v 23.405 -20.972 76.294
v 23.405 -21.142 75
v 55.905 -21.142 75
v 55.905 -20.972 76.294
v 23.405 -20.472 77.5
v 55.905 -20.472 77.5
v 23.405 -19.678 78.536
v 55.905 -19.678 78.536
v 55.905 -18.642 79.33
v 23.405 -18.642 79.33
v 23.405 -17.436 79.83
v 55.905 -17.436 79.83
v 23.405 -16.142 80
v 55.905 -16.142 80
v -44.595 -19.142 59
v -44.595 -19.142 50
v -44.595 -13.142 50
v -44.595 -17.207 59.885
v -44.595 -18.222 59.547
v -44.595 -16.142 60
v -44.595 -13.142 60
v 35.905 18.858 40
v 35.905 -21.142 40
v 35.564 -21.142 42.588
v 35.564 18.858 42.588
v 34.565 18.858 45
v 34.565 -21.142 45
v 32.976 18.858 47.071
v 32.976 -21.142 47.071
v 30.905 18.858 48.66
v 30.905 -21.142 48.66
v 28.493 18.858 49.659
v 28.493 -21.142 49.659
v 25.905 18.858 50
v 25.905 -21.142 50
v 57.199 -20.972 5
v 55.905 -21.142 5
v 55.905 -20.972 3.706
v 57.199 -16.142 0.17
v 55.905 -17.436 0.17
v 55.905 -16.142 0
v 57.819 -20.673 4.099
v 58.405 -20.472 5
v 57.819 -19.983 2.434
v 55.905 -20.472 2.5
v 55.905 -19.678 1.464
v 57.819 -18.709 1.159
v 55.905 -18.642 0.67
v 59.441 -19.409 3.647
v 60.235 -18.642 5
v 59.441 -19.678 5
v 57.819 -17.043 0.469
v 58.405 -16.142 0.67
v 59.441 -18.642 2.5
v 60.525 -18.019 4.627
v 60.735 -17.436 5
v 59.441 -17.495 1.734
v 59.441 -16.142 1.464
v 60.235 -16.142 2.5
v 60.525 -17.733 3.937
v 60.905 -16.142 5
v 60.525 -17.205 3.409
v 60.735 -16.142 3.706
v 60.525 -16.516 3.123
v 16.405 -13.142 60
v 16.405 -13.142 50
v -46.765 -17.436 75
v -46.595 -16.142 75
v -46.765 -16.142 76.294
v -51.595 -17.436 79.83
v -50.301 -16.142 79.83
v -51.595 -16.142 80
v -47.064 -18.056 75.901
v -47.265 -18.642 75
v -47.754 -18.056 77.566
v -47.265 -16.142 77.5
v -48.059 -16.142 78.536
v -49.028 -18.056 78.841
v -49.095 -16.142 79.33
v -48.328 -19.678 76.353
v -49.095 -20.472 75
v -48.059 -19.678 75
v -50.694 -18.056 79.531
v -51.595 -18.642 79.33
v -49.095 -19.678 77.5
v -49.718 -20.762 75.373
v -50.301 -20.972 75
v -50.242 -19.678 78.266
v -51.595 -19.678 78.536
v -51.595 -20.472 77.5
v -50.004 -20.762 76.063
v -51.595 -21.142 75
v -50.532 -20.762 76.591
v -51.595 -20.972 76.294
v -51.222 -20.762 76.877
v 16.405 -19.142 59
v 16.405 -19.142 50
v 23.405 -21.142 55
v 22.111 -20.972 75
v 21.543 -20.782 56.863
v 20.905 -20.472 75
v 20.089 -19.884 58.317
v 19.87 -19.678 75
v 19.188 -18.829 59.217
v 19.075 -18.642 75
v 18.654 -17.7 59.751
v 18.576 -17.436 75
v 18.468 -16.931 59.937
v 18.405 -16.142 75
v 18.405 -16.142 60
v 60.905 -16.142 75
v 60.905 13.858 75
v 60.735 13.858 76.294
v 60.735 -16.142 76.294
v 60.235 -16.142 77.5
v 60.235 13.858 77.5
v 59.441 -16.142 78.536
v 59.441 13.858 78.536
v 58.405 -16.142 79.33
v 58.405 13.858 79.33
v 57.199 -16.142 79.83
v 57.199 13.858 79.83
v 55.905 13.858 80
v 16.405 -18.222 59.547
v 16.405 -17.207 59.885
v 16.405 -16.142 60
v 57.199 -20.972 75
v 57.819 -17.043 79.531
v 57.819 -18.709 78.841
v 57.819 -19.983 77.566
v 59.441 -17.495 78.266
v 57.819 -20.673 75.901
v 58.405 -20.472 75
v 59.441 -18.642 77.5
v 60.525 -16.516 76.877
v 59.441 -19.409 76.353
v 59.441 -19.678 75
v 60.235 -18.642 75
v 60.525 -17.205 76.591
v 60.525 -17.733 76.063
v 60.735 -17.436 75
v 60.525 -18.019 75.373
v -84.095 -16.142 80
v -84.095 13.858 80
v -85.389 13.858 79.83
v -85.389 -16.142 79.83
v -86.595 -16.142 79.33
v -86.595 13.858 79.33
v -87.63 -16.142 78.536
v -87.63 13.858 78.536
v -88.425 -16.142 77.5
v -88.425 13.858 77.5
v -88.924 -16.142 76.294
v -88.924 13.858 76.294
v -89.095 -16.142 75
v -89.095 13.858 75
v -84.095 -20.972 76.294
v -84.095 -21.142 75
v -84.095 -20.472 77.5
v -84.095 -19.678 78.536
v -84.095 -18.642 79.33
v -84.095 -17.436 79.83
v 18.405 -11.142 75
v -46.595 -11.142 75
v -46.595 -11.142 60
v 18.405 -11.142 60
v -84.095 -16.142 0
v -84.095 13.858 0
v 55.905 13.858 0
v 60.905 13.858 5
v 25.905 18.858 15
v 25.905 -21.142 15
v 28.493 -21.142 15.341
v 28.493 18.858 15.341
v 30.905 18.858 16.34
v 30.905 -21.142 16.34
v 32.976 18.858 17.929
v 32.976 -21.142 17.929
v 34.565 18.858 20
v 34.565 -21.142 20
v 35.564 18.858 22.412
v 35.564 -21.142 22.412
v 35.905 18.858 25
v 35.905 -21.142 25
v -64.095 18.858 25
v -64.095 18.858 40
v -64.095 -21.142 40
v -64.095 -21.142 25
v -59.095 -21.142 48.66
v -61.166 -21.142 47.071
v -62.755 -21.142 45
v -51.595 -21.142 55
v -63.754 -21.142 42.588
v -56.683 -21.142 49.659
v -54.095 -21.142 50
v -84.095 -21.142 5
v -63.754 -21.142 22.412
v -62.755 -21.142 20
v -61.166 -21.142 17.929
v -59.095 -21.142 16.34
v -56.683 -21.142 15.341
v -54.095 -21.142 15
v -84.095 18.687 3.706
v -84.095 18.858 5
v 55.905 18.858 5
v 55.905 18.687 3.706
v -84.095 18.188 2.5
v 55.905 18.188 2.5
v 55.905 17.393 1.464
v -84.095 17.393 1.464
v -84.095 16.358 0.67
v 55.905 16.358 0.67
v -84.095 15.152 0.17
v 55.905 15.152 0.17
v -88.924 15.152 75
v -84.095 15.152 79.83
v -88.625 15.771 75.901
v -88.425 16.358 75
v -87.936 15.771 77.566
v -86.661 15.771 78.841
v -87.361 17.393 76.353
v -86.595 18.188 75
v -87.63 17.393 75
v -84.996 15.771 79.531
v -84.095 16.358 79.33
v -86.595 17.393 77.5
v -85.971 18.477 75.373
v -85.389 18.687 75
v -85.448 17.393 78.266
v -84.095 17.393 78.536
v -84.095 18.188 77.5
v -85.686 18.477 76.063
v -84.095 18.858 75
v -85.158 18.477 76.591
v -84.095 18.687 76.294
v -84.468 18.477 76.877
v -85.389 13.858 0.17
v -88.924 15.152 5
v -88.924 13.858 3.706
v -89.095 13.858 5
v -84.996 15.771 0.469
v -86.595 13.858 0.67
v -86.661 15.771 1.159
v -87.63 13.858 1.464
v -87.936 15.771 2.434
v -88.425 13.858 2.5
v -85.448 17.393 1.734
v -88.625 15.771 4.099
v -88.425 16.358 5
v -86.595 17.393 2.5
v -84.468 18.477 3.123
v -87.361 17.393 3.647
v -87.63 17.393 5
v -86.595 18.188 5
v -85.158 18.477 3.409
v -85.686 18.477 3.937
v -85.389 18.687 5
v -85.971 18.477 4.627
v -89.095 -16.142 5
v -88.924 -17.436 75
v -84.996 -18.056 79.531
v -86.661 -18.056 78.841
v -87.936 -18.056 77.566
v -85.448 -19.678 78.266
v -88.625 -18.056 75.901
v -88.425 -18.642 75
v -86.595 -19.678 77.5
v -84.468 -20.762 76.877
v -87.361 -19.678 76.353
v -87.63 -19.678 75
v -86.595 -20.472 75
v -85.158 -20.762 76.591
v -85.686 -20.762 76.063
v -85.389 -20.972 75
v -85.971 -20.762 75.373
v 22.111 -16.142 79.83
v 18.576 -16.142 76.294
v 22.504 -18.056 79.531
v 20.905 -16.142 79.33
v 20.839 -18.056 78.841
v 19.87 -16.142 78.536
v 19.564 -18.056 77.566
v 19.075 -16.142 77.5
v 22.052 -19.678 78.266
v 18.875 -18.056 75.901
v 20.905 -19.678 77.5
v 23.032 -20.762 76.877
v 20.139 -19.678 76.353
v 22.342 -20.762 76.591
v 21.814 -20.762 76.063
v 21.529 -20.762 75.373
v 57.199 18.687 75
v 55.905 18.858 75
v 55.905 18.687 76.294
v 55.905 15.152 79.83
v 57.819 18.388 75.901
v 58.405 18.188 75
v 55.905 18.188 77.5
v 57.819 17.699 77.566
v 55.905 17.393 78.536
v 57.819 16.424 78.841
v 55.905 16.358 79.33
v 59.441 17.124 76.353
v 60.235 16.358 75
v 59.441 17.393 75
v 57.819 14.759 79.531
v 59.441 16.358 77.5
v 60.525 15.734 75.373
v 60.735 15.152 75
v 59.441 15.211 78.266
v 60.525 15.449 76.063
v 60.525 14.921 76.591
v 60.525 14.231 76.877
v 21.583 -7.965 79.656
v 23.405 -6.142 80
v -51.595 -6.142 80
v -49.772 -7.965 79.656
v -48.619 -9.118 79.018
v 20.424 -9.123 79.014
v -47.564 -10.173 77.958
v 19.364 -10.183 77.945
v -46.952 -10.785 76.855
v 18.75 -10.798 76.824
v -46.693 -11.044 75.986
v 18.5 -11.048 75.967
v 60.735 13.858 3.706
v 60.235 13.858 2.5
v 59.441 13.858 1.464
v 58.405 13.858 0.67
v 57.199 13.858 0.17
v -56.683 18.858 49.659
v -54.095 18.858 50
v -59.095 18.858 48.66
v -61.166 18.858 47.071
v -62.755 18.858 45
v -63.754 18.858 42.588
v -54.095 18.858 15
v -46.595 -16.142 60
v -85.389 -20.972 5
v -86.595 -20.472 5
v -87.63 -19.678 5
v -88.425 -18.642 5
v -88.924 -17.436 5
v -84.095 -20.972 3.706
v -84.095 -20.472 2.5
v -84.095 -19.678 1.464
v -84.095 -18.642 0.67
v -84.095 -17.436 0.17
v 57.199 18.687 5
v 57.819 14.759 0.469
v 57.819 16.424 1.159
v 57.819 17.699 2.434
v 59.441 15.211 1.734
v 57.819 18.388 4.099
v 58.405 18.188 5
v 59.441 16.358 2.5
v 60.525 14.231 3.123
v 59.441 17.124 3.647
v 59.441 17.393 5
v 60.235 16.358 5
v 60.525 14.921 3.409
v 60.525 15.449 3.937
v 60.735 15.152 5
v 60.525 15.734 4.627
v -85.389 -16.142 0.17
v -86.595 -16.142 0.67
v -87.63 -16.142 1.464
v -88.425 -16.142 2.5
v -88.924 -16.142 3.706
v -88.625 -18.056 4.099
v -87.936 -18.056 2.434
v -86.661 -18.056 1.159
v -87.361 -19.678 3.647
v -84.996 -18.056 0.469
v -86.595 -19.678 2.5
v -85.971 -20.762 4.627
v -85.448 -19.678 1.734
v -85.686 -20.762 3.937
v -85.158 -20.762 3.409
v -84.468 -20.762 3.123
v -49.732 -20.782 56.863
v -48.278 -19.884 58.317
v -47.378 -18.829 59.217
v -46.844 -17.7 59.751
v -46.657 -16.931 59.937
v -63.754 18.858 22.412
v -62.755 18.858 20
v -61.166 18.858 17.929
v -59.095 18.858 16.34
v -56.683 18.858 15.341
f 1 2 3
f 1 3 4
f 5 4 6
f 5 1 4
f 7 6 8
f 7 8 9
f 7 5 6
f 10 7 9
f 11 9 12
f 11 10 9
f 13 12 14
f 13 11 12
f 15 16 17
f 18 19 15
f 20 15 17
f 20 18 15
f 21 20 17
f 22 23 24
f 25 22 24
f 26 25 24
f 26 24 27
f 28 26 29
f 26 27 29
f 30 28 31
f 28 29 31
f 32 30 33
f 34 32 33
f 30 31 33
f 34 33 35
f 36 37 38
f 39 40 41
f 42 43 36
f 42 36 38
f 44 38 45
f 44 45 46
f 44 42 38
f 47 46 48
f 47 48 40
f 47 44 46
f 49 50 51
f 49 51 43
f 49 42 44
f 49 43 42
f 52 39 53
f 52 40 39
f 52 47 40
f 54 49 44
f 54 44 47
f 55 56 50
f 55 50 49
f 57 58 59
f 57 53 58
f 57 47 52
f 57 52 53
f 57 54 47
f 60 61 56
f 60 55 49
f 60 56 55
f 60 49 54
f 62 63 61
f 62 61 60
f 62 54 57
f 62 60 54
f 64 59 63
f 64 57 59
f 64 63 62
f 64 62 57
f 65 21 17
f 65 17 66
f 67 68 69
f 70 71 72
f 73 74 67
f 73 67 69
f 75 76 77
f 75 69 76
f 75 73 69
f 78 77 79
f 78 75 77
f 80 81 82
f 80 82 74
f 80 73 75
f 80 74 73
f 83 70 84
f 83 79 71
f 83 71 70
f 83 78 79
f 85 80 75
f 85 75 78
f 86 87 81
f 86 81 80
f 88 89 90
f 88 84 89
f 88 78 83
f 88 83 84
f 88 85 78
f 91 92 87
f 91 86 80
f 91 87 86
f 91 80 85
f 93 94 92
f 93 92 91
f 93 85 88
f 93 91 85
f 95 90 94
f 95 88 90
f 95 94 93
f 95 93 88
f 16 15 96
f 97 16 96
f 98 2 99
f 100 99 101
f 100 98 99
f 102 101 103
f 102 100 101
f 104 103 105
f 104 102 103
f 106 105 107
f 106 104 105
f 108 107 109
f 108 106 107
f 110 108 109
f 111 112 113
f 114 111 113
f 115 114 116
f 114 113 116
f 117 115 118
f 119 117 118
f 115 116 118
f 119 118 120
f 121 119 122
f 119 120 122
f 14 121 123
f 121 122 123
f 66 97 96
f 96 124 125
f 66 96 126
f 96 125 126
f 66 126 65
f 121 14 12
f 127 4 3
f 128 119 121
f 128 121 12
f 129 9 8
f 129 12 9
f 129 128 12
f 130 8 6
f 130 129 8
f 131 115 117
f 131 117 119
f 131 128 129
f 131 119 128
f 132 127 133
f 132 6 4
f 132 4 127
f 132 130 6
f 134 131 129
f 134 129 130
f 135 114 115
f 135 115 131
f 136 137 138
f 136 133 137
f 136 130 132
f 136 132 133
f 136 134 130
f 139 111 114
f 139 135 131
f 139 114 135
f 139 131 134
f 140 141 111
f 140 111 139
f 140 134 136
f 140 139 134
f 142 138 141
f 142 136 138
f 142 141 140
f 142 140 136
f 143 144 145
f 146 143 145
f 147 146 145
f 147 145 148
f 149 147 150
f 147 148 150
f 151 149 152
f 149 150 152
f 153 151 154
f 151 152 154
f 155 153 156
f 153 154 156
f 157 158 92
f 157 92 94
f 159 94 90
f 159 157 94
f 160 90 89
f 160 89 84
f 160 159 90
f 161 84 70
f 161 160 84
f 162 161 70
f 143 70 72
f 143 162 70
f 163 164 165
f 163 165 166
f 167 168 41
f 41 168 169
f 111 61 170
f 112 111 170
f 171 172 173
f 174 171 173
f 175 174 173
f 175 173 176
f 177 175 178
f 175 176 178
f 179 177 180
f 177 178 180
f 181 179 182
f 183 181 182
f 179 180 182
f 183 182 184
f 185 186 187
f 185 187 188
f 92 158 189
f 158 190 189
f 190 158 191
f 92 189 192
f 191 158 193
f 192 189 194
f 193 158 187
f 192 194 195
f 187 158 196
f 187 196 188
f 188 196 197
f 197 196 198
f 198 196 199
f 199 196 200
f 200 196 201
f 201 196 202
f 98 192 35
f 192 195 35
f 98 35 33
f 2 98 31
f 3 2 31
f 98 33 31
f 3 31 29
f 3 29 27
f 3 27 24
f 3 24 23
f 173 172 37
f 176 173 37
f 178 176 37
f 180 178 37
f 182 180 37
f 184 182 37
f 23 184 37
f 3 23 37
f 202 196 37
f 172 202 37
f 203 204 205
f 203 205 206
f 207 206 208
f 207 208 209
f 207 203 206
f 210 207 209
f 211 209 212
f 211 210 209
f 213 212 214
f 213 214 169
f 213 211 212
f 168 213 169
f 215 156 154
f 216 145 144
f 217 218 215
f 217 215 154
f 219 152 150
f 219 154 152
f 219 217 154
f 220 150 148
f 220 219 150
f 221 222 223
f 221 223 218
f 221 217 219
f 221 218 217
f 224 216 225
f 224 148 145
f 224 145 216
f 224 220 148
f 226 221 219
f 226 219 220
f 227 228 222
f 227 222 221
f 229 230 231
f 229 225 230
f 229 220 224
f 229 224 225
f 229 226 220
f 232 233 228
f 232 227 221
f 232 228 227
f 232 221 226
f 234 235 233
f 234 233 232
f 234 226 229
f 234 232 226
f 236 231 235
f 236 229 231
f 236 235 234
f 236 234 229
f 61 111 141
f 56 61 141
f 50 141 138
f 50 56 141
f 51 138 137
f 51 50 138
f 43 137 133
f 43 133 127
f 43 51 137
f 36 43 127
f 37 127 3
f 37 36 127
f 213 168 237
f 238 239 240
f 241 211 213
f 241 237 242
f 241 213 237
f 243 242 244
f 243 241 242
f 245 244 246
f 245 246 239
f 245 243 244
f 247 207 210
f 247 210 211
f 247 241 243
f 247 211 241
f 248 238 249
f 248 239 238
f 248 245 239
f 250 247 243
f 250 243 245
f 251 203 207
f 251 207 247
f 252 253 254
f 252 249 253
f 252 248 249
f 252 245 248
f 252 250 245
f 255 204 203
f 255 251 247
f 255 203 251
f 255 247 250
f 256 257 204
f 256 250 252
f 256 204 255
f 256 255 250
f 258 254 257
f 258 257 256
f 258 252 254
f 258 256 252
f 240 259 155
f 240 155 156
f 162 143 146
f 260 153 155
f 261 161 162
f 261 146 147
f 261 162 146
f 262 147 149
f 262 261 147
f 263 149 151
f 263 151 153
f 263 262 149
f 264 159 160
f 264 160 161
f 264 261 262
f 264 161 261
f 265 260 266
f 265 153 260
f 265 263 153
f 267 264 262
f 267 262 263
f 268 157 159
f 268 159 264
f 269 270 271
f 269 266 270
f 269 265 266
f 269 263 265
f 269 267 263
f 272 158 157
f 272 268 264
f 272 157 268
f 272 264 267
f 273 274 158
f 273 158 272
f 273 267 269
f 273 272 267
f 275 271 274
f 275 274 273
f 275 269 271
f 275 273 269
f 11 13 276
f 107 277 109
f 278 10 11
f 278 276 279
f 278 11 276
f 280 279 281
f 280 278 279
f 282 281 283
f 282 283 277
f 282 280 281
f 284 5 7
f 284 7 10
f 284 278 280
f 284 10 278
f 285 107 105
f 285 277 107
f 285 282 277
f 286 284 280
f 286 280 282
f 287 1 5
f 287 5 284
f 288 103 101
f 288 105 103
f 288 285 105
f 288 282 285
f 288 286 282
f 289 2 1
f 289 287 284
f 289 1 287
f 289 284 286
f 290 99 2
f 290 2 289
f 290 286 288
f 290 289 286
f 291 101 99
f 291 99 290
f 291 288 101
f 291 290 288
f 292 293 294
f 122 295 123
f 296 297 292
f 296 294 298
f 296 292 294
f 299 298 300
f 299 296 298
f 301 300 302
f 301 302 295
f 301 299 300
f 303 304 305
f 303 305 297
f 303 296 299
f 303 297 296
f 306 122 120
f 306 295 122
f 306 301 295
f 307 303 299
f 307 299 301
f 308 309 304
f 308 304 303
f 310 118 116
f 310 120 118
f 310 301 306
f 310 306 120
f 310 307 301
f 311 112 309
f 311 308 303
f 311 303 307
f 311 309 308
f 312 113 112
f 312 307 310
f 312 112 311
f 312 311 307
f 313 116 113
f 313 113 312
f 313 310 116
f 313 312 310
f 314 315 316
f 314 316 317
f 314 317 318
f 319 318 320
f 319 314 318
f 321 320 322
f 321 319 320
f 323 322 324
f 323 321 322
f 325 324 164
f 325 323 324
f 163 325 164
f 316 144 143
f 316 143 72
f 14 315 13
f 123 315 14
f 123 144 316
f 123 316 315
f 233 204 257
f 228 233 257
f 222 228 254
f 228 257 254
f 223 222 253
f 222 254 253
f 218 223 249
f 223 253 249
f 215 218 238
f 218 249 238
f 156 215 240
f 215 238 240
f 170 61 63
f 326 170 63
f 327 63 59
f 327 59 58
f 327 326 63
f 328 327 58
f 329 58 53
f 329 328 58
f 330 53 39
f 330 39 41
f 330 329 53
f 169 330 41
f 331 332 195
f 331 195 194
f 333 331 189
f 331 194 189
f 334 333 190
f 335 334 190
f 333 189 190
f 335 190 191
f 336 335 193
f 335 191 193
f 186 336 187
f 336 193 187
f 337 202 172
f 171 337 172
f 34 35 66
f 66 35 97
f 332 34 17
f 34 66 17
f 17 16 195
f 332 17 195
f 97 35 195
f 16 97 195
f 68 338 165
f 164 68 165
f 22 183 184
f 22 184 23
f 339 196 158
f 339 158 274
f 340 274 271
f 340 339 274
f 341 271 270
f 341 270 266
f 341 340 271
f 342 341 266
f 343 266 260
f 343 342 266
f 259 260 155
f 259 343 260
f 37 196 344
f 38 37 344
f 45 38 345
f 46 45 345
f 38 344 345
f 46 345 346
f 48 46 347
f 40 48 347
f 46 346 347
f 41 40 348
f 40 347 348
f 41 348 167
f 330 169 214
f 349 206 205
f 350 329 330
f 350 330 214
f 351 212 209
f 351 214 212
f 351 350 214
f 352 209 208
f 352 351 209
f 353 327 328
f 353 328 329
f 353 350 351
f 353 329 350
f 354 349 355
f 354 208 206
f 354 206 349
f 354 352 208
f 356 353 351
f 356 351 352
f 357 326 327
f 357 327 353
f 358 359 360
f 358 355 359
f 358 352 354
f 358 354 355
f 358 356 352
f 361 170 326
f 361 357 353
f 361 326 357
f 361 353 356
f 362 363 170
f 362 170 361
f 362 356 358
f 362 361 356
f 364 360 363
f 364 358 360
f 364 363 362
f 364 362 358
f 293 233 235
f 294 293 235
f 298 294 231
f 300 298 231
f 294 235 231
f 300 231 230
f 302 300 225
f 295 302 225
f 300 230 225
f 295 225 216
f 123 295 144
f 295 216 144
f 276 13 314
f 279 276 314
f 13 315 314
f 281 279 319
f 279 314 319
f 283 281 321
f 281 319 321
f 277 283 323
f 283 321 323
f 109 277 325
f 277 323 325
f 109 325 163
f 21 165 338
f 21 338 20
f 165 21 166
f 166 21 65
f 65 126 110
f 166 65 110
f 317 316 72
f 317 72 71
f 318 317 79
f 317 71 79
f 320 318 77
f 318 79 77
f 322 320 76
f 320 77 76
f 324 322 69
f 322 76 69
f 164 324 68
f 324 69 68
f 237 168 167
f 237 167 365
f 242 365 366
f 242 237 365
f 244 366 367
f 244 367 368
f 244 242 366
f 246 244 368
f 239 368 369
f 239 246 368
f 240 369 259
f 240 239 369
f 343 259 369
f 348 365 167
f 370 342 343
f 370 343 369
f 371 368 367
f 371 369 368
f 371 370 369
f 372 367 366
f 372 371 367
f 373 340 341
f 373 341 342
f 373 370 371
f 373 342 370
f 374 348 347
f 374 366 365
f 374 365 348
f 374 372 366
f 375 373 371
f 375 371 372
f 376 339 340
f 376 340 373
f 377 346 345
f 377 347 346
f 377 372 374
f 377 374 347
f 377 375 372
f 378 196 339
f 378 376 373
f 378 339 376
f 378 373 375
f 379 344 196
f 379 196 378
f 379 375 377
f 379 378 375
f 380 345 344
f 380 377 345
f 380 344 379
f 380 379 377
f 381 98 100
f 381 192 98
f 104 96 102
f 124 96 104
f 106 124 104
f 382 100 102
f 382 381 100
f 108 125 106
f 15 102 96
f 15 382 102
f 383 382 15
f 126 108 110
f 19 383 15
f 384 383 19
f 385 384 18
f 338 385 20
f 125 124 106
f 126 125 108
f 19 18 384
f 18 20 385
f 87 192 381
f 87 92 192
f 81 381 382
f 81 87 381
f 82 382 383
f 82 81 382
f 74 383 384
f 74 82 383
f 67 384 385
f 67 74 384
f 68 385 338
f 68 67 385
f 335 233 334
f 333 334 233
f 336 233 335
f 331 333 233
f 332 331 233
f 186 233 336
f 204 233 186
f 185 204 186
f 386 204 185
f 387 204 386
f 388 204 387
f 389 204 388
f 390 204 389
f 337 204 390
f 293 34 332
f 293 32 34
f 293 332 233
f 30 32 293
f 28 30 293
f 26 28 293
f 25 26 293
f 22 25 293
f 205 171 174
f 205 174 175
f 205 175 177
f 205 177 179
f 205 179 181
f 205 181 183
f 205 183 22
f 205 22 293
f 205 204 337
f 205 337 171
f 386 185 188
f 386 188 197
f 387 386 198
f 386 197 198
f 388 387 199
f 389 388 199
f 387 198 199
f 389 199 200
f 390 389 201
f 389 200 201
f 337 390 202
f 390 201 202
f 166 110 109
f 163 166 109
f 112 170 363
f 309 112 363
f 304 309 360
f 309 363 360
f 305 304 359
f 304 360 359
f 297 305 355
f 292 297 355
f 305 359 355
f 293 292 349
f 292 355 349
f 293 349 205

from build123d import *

# Parameters (mm, degrees)
F0_W          = 150
F0_H          = 40
F1_DEPTH      = 80
F2_W          = 65
F2_H          = 20
F3_DEPTH      = 10
F5_DEPTH      = 287
F6_W          = 61
F6_H          = 6
F7_DEPTH      = 25
F8_T1_DEPTH   = 65
F8_T3_DEPTH   = 70
F8_T5_DEPTH   = 32.5
F8_T7_DEPTH   = 32.5
F8_T9_DEPTH   = 30
F8_T11_DEPTH  = 140
F8_T13_DEPTH  = 15
F8_T15_DEPTH  = 5
F8_S19_W      = 5
F8_S19_H      = 5
F8_T20_DEPTH  = 5
F8_S25_W      = 5
F8_S25_H      = 5
F8_T26_DEPTH  = 5
F8_S31_W      = 5
F8_S31_H      = 5
F8_T32_DEPTH  = 5
F8_S37_W      = 5
F8_S37_H      = 5
F8_T38_DEPTH  = 5
F8_S43_W      = 5
F8_S43_H      = 5
F8_T44_DEPTH  = 5
F8_S49_W      = 5
F8_S49_H      = 5
F8_T50_DEPTH  = 5
F8_S55_W      = 5
F8_S55_H      = 5
F8_T56_DEPTH  = 5
F8_S61_W      = 5
F8_S61_H      = 5
F8_T62_DEPTH  = 5
F8_S67_W      = 5
F8_S67_H      = 5
F8_T68_DEPTH  = 5
F8_S73_W      = 5
F8_S73_H      = 5
F8_T74_DEPTH  = 5
F8_T81_DEPTH  = 17.5
F8_T85_DEPTH  = 77.5
F8_T92_DEPTH  = 77.5
F8_T96_DEPTH  = 17.5
F8_T103_DEPTH = 27.5
F8_T107_DEPTH = 77.5
F8_T114_DEPTH = 27.5
F8_T118_DEPTH = 77.5


# Not quite as in the source:
# - a fillet or chamfer that OpenCascade refuses, or shapes differently, is made with other operations: its cross-section is extruded or revolved along the edge and cut away or added


with BuildPart() as f1:
    # F0 (on Top) → F1 (new body)
    with BuildSketch(Plane.XY):
        with Locations((-14.0948228538, -1.1422424763)):
            Rectangle(F0_W, F0_H)
    extrude(amount=F1_DEPTH)

    # F2 (on face) → F3 (cut)
    with BuildSketch(Plane.XZ.offset(21.1422424763)):
        with Locations((-14.0948228538, 70)):
            Rectangle(F2_W, F2_H)
    extrude(amount=-F3_DEPTH, mode=Mode.SUBTRACT)

    # F4 (on face) → F5 (cut)
    with BuildSketch(Plane.XZ.offset(21.1422424763)):
        with BuildLine():
            Line((25.9051771462, 50), (-54.0948228538, 50))
            ThreePointArc((-54.0948228538, 50), (-61.1658906657, 47.0710678119), (-64.0948228538, 40))
            Line((-64.0948228538, 40), (-64.0948228538, 25))
            ThreePointArc((-64.0948228538, 25), (-61.1658906657, 17.9289321881), (-54.0948228538, 15))
            Line((-54.0948228538, 15), (25.9051771462, 15))
            ThreePointArc((25.9051771462, 15), (32.9762449581, 17.9289321881), (35.9051771462, 25))
            Line((35.9051771462, 25), (35.9051771462, 40))
            ThreePointArc((35.9051771462, 40), (32.9762449581, 47.0710678119), (25.9051771462, 50))
        make_face()
    extrude(amount=-F5_DEPTH, mode=Mode.SUBTRACT)

    # F6 (on face) → F7 (cut)
    with BuildSketch(Plane.XY.offset(60)):
        with Locations((-14.0948228538, -16.1422424763)):
            Rectangle(F6_W, F6_H)
    extrude(amount=-F7_DEPTH, mode=Mode.SUBTRACT)

    # F8: fillet of radius 5 on 19 edges, made by hand

    # F8_s2 → F8_t1 (cut)
    with BuildSketch(Plane.YZ.offset(-46.5948228538)):
        with BuildLine():
            ThreePointArc((-6.1422424763, 80), (-9.6777763823, 78.5355339059), (-11.1422424763, 75))
            Line((-11.1422424763, 75), (-11.1422424763, 80))
            Line((-11.1422424763, 80), (-6.1422424763, 80))
        make_face()
        with BuildLine():
            ThreePointArc((-21.1422424763, 55), (-19.6777763823, 58.5355339059), (-16.1422424763, 60))
            Line((-16.1422424763, 60), (-21.1422424763, 60))
            Line((-21.1422424763, 60), (-21.1422424763, 55))
        make_face()
    extrude(amount=F8_T1_DEPTH, mode=Mode.SUBTRACT)

    # F8_s4 → F8_t3 (cut)
    with BuildSketch(Plane.XY.offset(5)):
        with BuildLine():
            ThreePointArc((-84.0948228538, -21.1422424763), (-87.6303567597, -19.6777763823), (-89.0948228538, -16.1422424763))
            Line((-89.0948228538, -16.1422424763), (-89.0948228538, -21.1422424763))
            Line((-89.0948228538, -21.1422424763), (-84.0948228538, -21.1422424763))
        make_face()
        with BuildLine():
            ThreePointArc((60.9051771462, -16.1422424763), (59.4407110521, -19.6777763823), (55.9051771462, -21.1422424763))
            Line((55.9051771462, -21.1422424763), (60.9051771462, -21.1422424763))
            Line((60.9051771462, -21.1422424763), (60.9051771462, -16.1422424763))
        make_face()
        with BuildLine():
            ThreePointArc((-84.0948228538, 18.8577575237), (-87.6303567597, 17.3932914296), (-89.0948228538, 13.8577575237))
            Line((-89.0948228538, 13.8577575237), (-89.0948228538, 18.8577575237))
            Line((-89.0948228538, 18.8577575237), (-84.0948228538, 18.8577575237))
        make_face()
        with BuildLine():
            ThreePointArc((60.9051771462, 13.8577575237), (59.4407110521, 17.3932914296), (55.9051771462, 18.8577575237))
            Line((55.9051771462, 18.8577575237), (60.9051771462, 18.8577575237))
            Line((60.9051771462, 18.8577575237), (60.9051771462, 13.8577575237))
        make_face()
    extrude(amount=F8_T3_DEPTH, mode=Mode.SUBTRACT)

    # F8_s6 → F8_t5 (cut)
    with BuildSketch(Plane.YZ.offset(23.4051771462)):
        with BuildLine():
            ThreePointArc((-21.1422424763, 75), (-19.6777763823, 78.5355339059), (-16.1422424763, 80))
            Line((-16.1422424763, 80), (-21.1422424763, 80))
            Line((-21.1422424763, 80), (-21.1422424763, 75))
        make_face()
    extrude(amount=F8_T5_DEPTH, mode=Mode.SUBTRACT)

    # F8_s8 → F8_t7 (cut)
    with BuildSketch(Plane.YZ.offset(-84.0948228538)):
        with BuildLine():
            ThreePointArc((-21.1422424763, 75), (-19.6777763823, 78.5355339059), (-16.1422424763, 80))
            Line((-16.1422424763, 80), (-21.1422424763, 80))
            Line((-21.1422424763, 80), (-21.1422424763, 75))
        make_face()
    extrude(amount=F8_T7_DEPTH, mode=Mode.SUBTRACT)

    # F8_s10 → F8_t9 (cut)
    with BuildSketch(Plane.XZ.offset(-13.8577575237)):
        with BuildLine():
            ThreePointArc((60.9051771462, 5), (59.4407110521, 1.4644660941), (55.9051771462, 0))
            Line((55.9051771462, 0), (60.9051771462, 0))
            Line((60.9051771462, 0), (60.9051771462, 5))
        make_face()
        with BuildLine():
            ThreePointArc((-84.0948228538, 0), (-87.6303567597, 1.4644660941), (-89.0948228538, 5))
            Line((-89.0948228538, 5), (-89.0948228538, 0))
            Line((-89.0948228538, 0), (-84.0948228538, 0))
        make_face()
        with BuildLine():
            ThreePointArc((-84.0948228538, 80), (-87.6303567597, 78.5355339059), (-89.0948228538, 75))
            Line((-89.0948228538, 75), (-89.0948228538, 80))
            Line((-89.0948228538, 80), (-84.0948228538, 80))
        make_face()
        with BuildLine():
            ThreePointArc((60.9051771462, 75), (59.4407110521, 78.5355339059), (55.9051771462, 80))
            Line((55.9051771462, 80), (60.9051771462, 80))
            Line((60.9051771462, 80), (60.9051771462, 75))
        make_face()
    extrude(amount=F8_T9_DEPTH, mode=Mode.SUBTRACT)

    # F8_s12 → F8_t11 (cut)
    with BuildSketch(Plane.YZ.offset(-84.0948228538)):
        with BuildLine():
            ThreePointArc((18.8577575237, 5), (17.3932914296, 1.4644660941), (13.8577575237, 0))
            Line((13.8577575237, 0), (18.8577575237, 0))
            Line((18.8577575237, 0), (18.8577575237, 5))
        make_face()
        with BuildLine():
            ThreePointArc((-21.1422424763, 5), (-19.6777763823, 1.4644660941), (-16.1422424763, 0))
            Line((-16.1422424763, 0), (-21.1422424763, 0))
            Line((-21.1422424763, 0), (-21.1422424763, 5))
        make_face()
        with BuildLine():
            ThreePointArc((18.8577575237, 75), (17.3932914296, 78.5355339059), (13.8577575237, 80))
            Line((13.8577575237, 80), (18.8577575237, 80))
            Line((18.8577575237, 80), (18.8577575237, 75))
        make_face()
    extrude(amount=F8_T11_DEPTH, mode=Mode.SUBTRACT)

    # F8_s14 → F8_t13 (cut)
    with BuildSketch(Plane.XY.offset(60)):
        with BuildLine():
            ThreePointArc((-51.5948228538, -21.1422424763), (-48.0592889479, -19.6777763823), (-46.5948228538, -16.1422424763))
            Line((-46.5948228538, -16.1422424763), (-46.5948228538, -21.1422424763))
            Line((-46.5948228538, -21.1422424763), (-51.5948228538, -21.1422424763))
        make_face()
        with BuildLine():
            ThreePointArc((23.4051771462, -21.1422424763), (19.8696432403, -19.6777763823), (18.4051771462, -16.1422424763))
            Line((18.4051771462, -16.1422424763), (18.4051771462, -21.1422424763))
            Line((18.4051771462, -21.1422424763), (23.4051771462, -21.1422424763))
        make_face()
    extrude(amount=F8_T13_DEPTH, mode=Mode.SUBTRACT)

    # F8_s16 → F8_t15 (cut)
    with BuildSketch(Plane.XZ.offset(11.1422424763)):
        with BuildLine():
            ThreePointArc((-51.5948228538, 80), (-48.0592889479, 78.5355339059), (-46.5948228538, 75))
            Line((-46.5948228538, 75), (-46.5948228538, 80))
            Line((-46.5948228538, 80), (-51.5948228538, 80))
        make_face()
        with BuildLine():
            ThreePointArc((23.4051771462, 80), (19.8696432403, 78.5355339059), (18.4051771462, 75))
            Line((18.4051771462, 75), (18.4051771462, 80))
            Line((18.4051771462, 80), (23.4051771462, 80))
        make_face()
    extrude(amount=F8_T15_DEPTH, mode=Mode.SUBTRACT)


with BuildPart() as f8_tool18:
    # F8_s19 → F8_t20 (new body)
    with BuildSketch(Plane.XZ.offset(16.1422424763)):
        with Locations((-86.5948228538, 2.5)):
            Rectangle(F8_S19_W, F8_S19_H)
    extrude(amount=F8_T20_DEPTH)

    # F8_s21 → F8_t22 (revolve, cut)
    with BuildSketch(Plane(origin=(-84.0948228538, -16.1422424763, 5), x_dir=(0.7071067812, 0, 0.7071067812), z_dir=(0.7071067812, 0, -0.7071067812))):
        with BuildLine():
            ThreePointArc((0, -5), (5, 0), (0, 5))
            Line((0, 5), (0, -5))
        make_face()
    revolve(axis=Axis((-84.0948228538, -16.1422424763, 5), (0, -1, 0)), mode=Mode.SUBTRACT)


with BuildPart() as f1_1:
    add(f1.part)

    # F8_t17: cut F8_tool18
    add(f8_tool18.part, mode=Mode.SUBTRACT)


with BuildPart() as f8_tool24:
    # F8_s25 → F8_t26 (new body)
    with BuildSketch(Plane.XZ.offset(16.1422424763)):
        with Locations((-86.5948228538, 77.5)):
            Rectangle(F8_S25_W, F8_S25_H)
    extrude(amount=F8_T26_DEPTH)

    # F8_s27 → F8_t28 (revolve, cut)
    with BuildSketch(Plane(origin=(-84.0948228538, -16.1422424763, 75), x_dir=(0.7071067812, 0, -0.7071067812), z_dir=(-0.7071067812, 0, -0.7071067812))):
        with BuildLine():
            ThreePointArc((0, -5), (5, 0), (0, 5))
            Line((0, 5), (0, -5))
        make_face()
    revolve(axis=Axis((-84.0948228538, -16.1422424763, 75), (0, -1, 0)), mode=Mode.SUBTRACT)


with BuildPart() as f1_2:
    add(f1_1.part)

    # F8_t23: cut F8_tool24
    add(f8_tool24.part, mode=Mode.SUBTRACT)


with BuildPart() as f8_tool30:
    # F8_s31 → F8_t32 (new body)
    with BuildSketch(Plane.YZ.offset(55.9051771462)):
        with Locations((-18.6422424763, 2.5)):
            Rectangle(F8_S31_W, F8_S31_H)
    extrude(amount=F8_T32_DEPTH)

    # F8_s33 → F8_t34 (revolve, cut)
    with BuildSketch(Plane(origin=(55.9051771462, -16.1422424763, 5), x_dir=(0, 0.7071067812, 0.7071067812), z_dir=(0, 0.7071067812, -0.7071067812))):
        with BuildLine():
            ThreePointArc((0, -5), (5, 0), (0, 5))
            Line((0, 5), (0, -5))
        make_face()
    revolve(axis=Axis((55.9051771462, -16.1422424763, 5), (1, 0, 0)), mode=Mode.SUBTRACT)


with BuildPart() as f1_3:
    add(f1_2.part)

    # F8_t29: cut F8_tool30
    add(f8_tool30.part, mode=Mode.SUBTRACT)


with BuildPart() as f8_tool36:
    # F8_s37 → F8_t38 (new body)
    with BuildSketch(Plane.YZ.offset(55.9051771462)):
        with Locations((-18.6422424763, 77.5)):
            Rectangle(F8_S37_W, F8_S37_H)
    extrude(amount=F8_T38_DEPTH)

    # F8_s39 → F8_t40 (revolve, cut)
    with BuildSketch(Plane(origin=(55.9051771462, -16.1422424763, 75), x_dir=(0, 0.7071067812, -0.7071067812), z_dir=(0, -0.7071067812, -0.7071067812))):
        with BuildLine():
            ThreePointArc((0, -5), (5, 0), (0, 5))
            Line((0, 5), (0, -5))
        make_face()
    revolve(axis=Axis((55.9051771462, -16.1422424763, 75), (1, 0, 0)), mode=Mode.SUBTRACT)


with BuildPart() as f1_4:
    add(f1_3.part)

    # F8_t35: cut F8_tool36
    add(f8_tool36.part, mode=Mode.SUBTRACT)


with BuildPart() as f8_tool42:
    # F8_s43 → F8_t44 (new body)
    with BuildSketch(Plane.XZ.offset(16.1422424763)):
        with Locations((20.9051771462, 77.5)):
            Rectangle(F8_S43_W, F8_S43_H)
    extrude(amount=F8_T44_DEPTH)

    # F8_s45 → F8_t46 (revolve, cut)
    with BuildSketch(Plane(origin=(23.4051771462, -16.1422424763, 75), x_dir=(0.7071067812, 0, -0.7071067812), z_dir=(-0.7071067812, 0, -0.7071067812))):
        with BuildLine():
            ThreePointArc((0, -5), (5, 0), (0, 5))
            Line((0, 5), (0, -5))
        make_face()
    revolve(axis=Axis((23.4051771462, -16.1422424763, 75), (0, -1, 0)), mode=Mode.SUBTRACT)


with BuildPart() as f1_5:
    add(f1_4.part)

    # F8_t41: cut F8_tool42
    add(f8_tool42.part, mode=Mode.SUBTRACT)


with BuildPart() as f8_tool48:
    # F8_s49 → F8_t50 (new body)
    with BuildSketch(Plane.XZ.offset(16.1422424763)):
        with Locations((-49.0948228538, 77.5)):
            Rectangle(F8_S49_W, F8_S49_H)
    extrude(amount=F8_T50_DEPTH)

    # F8_s51 → F8_t52 (revolve, cut)
    with BuildSketch(Plane(origin=(-51.5948228538, -16.1422424763, 75), x_dir=(-0.7071067812, 0, -0.7071067812), z_dir=(-0.7071067812, 0, 0.7071067812))):
        with BuildLine():
            ThreePointArc((0, -5), (5, 0), (0, 5))
            Line((0, 5), (0, -5))
        make_face()
    revolve(axis=Axis((-51.5948228538, -16.1422424763, 75), (0, -1, 0)), mode=Mode.SUBTRACT)


with BuildPart() as f1_6:
    add(f1_5.part)

    # F8_t47: cut F8_tool48
    add(f8_tool48.part, mode=Mode.SUBTRACT)


with BuildPart() as f8_tool54:
    # F8_s55 → F8_t56 (new body)
    with BuildSketch(Plane.YZ.offset(55.9051771462)):
        with Locations((16.3577575237, 2.5)):
            Rectangle(F8_S55_W, F8_S55_H)
    extrude(amount=F8_T56_DEPTH)

    # F8_s57 → F8_t58 (revolve, cut)
    with BuildSketch(Plane(origin=(55.9051771462, 13.8577575237, 5), x_dir=(0, -0.7071067812, 0.7071067812), z_dir=(0, 0.7071067812, 0.7071067812))):
        with BuildLine():
            ThreePointArc((0, -5), (5, 0), (0, 5))
            Line((0, 5), (0, -5))
        make_face()
    revolve(axis=Axis((55.9051771462, 13.8577575237, 5), (1, 0, 0)), mode=Mode.SUBTRACT)


with BuildPart() as f1_7:
    add(f1_6.part)

    # F8_t53: cut F8_tool54
    add(f8_tool54.part, mode=Mode.SUBTRACT)


with BuildPart() as f8_tool60:
    # F8_s61 → F8_t62 (new body)
    with BuildSketch(Plane.XZ.offset(-13.8577575237)):
        with Locations((-86.5948228538, 2.5)):
            Rectangle(F8_S61_W, F8_S61_H)
    extrude(amount=-F8_T62_DEPTH)

    # F8_s63 → F8_t64 (revolve, cut)
    with BuildSketch(Plane(origin=(-84.0948228538, 13.8577575237, 5), x_dir=(0.7071067812, 0, 0.7071067812), z_dir=(-0.7071067812, 0, 0.7071067812))):
        with BuildLine():
            ThreePointArc((0, -5), (5, 0), (0, 5))
            Line((0, 5), (0, -5))
        make_face()
    revolve(axis=Axis((-84.0948228538, 13.8577575237, 5), (0, 1, 0)), mode=Mode.SUBTRACT)


with BuildPart() as f1_8:
    add(f1_7.part)

    # F8_t59: cut F8_tool60
    add(f8_tool60.part, mode=Mode.SUBTRACT)


with BuildPart() as f8_tool66:
    # F8_s67 → F8_t68 (new body)
    with BuildSketch(Plane.XZ.offset(-13.8577575237)):
        with Locations((-86.5948228538, 77.5)):
            Rectangle(F8_S67_W, F8_S67_H)
    extrude(amount=-F8_T68_DEPTH)

    # F8_s69 → F8_t70 (revolve, cut)
    with BuildSketch(Plane(origin=(-84.0948228538, 13.8577575237, 75), x_dir=(0.7071067812, 0, -0.7071067812), z_dir=(0.7071067812, 0, 0.7071067812))):
        with BuildLine():
            ThreePointArc((0, -5), (5, 0), (0, 5))
            Line((0, 5), (0, -5))
        make_face()
    revolve(axis=Axis((-84.0948228538, 13.8577575237, 75), (0, 1, 0)), mode=Mode.SUBTRACT)


with BuildPart() as f1_9:
    add(f1_8.part)

    # F8_t65: cut F8_tool66
    add(f8_tool66.part, mode=Mode.SUBTRACT)


with BuildPart() as f8_tool72:
    # F8_s73 → F8_t74 (new body)
    with BuildSketch(Plane.YZ.offset(55.9051771462)):
        with Locations((16.3577575237, 77.5)):
            Rectangle(F8_S73_W, F8_S73_H)
    extrude(amount=F8_T74_DEPTH)

    # F8_s75 → F8_t76 (revolve, cut)
    with BuildSketch(Plane(origin=(55.9051771462, 13.8577575237, 75), x_dir=(0, -0.7071067812, -0.7071067812), z_dir=(0, -0.7071067812, 0.7071067812))):
        with BuildLine():
            ThreePointArc((0, -5), (5, 0), (0, 5))
            Line((0, 5), (0, -5))
        make_face()
    revolve(axis=Axis((55.9051771462, 13.8577575237, 75), (1, 0, 0)), mode=Mode.SUBTRACT)


with BuildPart() as f1_10:
    add(f1_9.part)

    # F8_t71: cut F8_tool72
    add(f8_tool72.part, mode=Mode.SUBTRACT)


with BuildPart() as f8_tool79:
    # F8_s80 → F8_t81 (new body)
    with BuildSketch(Plane.XZ.offset(16.1422424763)):
        with BuildLine():
            ThreePointArc((23.4051771462, 80), (19.8696432403, 78.5355339059), (18.4051771462, 75))
            Line((18.4051771462, 75), (18.4051771462, 80))
            Line((18.4051771462, 80), (23.4051771462, 80))
        make_face()
    extrude(amount=-F8_T81_DEPTH)

    split(bisect_by=Plane.XZ.offset(11.1422424763), keep=Keep.BOTTOM)


with BuildPart() as f8_tool83:
    # F8_s84 → F8_t85 (new body)
    with BuildSketch(Plane.YZ.offset(30.9051771462)):
        with BuildLine():
            ThreePointArc((-6.1422424763, 80), (-9.6777763823, 78.5355339059), (-11.1422424763, 75))
            Line((-11.1422424763, 75), (-11.1422424763, 80))
            Line((-11.1422424763, 80), (-6.1422424763, 80))
        make_face()
    extrude(amount=-F8_T85_DEPTH)

    split(bisect_by=Plane.YZ.offset(18.4051771462), keep=Keep.TOP)


with BuildPart() as f8_tool79_1:
    add(f8_tool79.part)

    # F8_t87: intersect F8_tool83
    add(f8_tool83.part, mode=Mode.INTERSECT)


with BuildPart() as f1_11:
    add(f1_10.part)

    # F8_t77: cut F8_tool79
    add(f8_tool79_1.part, mode=Mode.SUBTRACT)


with BuildPart() as f8_tool90:
    # F8_s91 → F8_t92 (new body)
    with BuildSketch(Plane.YZ.offset(18.4051771462)):
        with BuildLine():
            ThreePointArc((-6.1422424763, 80), (-9.6777763823, 78.5355339059), (-11.1422424763, 75))
            Line((-11.1422424763, 75), (-11.1422424763, 80))
            Line((-11.1422424763, 80), (-6.1422424763, 80))
        make_face()
    extrude(amount=-F8_T92_DEPTH)

    split(bisect_by=Plane.YZ.offset(-46.5948228538), keep=Keep.BOTTOM)


with BuildPart() as f8_tool94:
    # F8_s95 → F8_t96 (new body)
    with BuildSketch(Plane.XZ.offset(16.1422424763)):
        with BuildLine():
            ThreePointArc((-51.5948228538, 80), (-48.0592889479, 78.5355339059), (-46.5948228538, 75))
            Line((-46.5948228538, 75), (-46.5948228538, 80))
            Line((-46.5948228538, 80), (-51.5948228538, 80))
        make_face()
    extrude(amount=-F8_T96_DEPTH)

    split(bisect_by=Plane.XZ.offset(11.1422424763), keep=Keep.BOTTOM)


with BuildPart() as f8_tool90_1:
    add(f8_tool90.part)

    # F8_t98: intersect F8_tool94
    add(f8_tool94.part, mode=Mode.INTERSECT)


with BuildPart() as f1_12:
    add(f1_11.part)

    # F8_t88: cut F8_tool90
    add(f8_tool90_1.part, mode=Mode.SUBTRACT)


with BuildPart() as f8_tool101:
    # F8_s102 → F8_t103 (new body)
    with BuildSketch(Plane.XY.offset(75)):
        with BuildLine():
            ThreePointArc((-51.5948228538, -21.1422424763), (-48.0592889479, -19.6777763823), (-46.5948228538, -16.1422424763))
            Line((-46.5948228538, -16.1422424763), (-46.5948228538, -21.1422424763))
            Line((-46.5948228538, -21.1422424763), (-51.5948228538, -21.1422424763))
        make_face()
    extrude(amount=-F8_T103_DEPTH)

    split(bisect_by=Plane.XY.offset(60), keep=Keep.BOTTOM)


with BuildPart() as f8_tool105:
    # F8_s106 → F8_t107 (new body)
    with BuildSketch(Plane.YZ.offset(-59.0948228538)):
        with BuildLine():
            ThreePointArc((-21.1422424763, 55), (-19.6777763823, 58.5355339059), (-16.1422424763, 60))
            Line((-16.1422424763, 60), (-21.1422424763, 60))
            Line((-21.1422424763, 60), (-21.1422424763, 55))
        make_face()
    extrude(amount=F8_T107_DEPTH)

    split(bisect_by=Plane.YZ.offset(-46.5948228538), keep=Keep.BOTTOM)


with BuildPart() as f8_tool101_1:
    add(f8_tool101.part)

    # F8_t109: intersect F8_tool105
    add(f8_tool105.part, mode=Mode.INTERSECT)


with BuildPart() as f1_13:
    add(f1_12.part)

    # F8_t99: cut F8_tool101
    add(f8_tool101_1.part, mode=Mode.SUBTRACT)


with BuildPart() as f8_tool112:
    # F8_s113 → F8_t114 (new body)
    with BuildSketch(Plane.XY.offset(47.5)):
        with BuildLine():
            ThreePointArc((23.4051771462, -21.1422424763), (19.8696432403, -19.6777763823), (18.4051771462, -16.1422424763))
            Line((18.4051771462, -16.1422424763), (18.4051771462, -21.1422424763))
            Line((18.4051771462, -21.1422424763), (23.4051771462, -21.1422424763))
        make_face()
    extrude(amount=F8_T114_DEPTH)

    split(bisect_by=Plane.XY.offset(60), keep=Keep.BOTTOM)


with BuildPart() as f8_tool116:
    # F8_s117 → F8_t118 (new body)
    with BuildSketch(Plane.YZ.offset(-46.5948228538)):
        with BuildLine():
            ThreePointArc((-21.1422424763, 55), (-19.6777763823, 58.5355339059), (-16.1422424763, 60))
            Line((-16.1422424763, 60), (-21.1422424763, 60))
            Line((-21.1422424763, 60), (-21.1422424763, 55))
        make_face()
    extrude(amount=F8_T118_DEPTH)

    split(bisect_by=Plane.YZ.offset(18.4051771462), keep=Keep.TOP)


with BuildPart() as f8_tool112_1:
    add(f8_tool112.part)

    # F8_t120: intersect F8_tool116
    add(f8_tool116.part, mode=Mode.INTERSECT)


with BuildPart() as f1_14:
    add(f1_13.part)

    # F8_t110: cut F8_tool112
    add(f8_tool112_1.part, mode=Mode.SUBTRACT)


solid = f1_14.part
